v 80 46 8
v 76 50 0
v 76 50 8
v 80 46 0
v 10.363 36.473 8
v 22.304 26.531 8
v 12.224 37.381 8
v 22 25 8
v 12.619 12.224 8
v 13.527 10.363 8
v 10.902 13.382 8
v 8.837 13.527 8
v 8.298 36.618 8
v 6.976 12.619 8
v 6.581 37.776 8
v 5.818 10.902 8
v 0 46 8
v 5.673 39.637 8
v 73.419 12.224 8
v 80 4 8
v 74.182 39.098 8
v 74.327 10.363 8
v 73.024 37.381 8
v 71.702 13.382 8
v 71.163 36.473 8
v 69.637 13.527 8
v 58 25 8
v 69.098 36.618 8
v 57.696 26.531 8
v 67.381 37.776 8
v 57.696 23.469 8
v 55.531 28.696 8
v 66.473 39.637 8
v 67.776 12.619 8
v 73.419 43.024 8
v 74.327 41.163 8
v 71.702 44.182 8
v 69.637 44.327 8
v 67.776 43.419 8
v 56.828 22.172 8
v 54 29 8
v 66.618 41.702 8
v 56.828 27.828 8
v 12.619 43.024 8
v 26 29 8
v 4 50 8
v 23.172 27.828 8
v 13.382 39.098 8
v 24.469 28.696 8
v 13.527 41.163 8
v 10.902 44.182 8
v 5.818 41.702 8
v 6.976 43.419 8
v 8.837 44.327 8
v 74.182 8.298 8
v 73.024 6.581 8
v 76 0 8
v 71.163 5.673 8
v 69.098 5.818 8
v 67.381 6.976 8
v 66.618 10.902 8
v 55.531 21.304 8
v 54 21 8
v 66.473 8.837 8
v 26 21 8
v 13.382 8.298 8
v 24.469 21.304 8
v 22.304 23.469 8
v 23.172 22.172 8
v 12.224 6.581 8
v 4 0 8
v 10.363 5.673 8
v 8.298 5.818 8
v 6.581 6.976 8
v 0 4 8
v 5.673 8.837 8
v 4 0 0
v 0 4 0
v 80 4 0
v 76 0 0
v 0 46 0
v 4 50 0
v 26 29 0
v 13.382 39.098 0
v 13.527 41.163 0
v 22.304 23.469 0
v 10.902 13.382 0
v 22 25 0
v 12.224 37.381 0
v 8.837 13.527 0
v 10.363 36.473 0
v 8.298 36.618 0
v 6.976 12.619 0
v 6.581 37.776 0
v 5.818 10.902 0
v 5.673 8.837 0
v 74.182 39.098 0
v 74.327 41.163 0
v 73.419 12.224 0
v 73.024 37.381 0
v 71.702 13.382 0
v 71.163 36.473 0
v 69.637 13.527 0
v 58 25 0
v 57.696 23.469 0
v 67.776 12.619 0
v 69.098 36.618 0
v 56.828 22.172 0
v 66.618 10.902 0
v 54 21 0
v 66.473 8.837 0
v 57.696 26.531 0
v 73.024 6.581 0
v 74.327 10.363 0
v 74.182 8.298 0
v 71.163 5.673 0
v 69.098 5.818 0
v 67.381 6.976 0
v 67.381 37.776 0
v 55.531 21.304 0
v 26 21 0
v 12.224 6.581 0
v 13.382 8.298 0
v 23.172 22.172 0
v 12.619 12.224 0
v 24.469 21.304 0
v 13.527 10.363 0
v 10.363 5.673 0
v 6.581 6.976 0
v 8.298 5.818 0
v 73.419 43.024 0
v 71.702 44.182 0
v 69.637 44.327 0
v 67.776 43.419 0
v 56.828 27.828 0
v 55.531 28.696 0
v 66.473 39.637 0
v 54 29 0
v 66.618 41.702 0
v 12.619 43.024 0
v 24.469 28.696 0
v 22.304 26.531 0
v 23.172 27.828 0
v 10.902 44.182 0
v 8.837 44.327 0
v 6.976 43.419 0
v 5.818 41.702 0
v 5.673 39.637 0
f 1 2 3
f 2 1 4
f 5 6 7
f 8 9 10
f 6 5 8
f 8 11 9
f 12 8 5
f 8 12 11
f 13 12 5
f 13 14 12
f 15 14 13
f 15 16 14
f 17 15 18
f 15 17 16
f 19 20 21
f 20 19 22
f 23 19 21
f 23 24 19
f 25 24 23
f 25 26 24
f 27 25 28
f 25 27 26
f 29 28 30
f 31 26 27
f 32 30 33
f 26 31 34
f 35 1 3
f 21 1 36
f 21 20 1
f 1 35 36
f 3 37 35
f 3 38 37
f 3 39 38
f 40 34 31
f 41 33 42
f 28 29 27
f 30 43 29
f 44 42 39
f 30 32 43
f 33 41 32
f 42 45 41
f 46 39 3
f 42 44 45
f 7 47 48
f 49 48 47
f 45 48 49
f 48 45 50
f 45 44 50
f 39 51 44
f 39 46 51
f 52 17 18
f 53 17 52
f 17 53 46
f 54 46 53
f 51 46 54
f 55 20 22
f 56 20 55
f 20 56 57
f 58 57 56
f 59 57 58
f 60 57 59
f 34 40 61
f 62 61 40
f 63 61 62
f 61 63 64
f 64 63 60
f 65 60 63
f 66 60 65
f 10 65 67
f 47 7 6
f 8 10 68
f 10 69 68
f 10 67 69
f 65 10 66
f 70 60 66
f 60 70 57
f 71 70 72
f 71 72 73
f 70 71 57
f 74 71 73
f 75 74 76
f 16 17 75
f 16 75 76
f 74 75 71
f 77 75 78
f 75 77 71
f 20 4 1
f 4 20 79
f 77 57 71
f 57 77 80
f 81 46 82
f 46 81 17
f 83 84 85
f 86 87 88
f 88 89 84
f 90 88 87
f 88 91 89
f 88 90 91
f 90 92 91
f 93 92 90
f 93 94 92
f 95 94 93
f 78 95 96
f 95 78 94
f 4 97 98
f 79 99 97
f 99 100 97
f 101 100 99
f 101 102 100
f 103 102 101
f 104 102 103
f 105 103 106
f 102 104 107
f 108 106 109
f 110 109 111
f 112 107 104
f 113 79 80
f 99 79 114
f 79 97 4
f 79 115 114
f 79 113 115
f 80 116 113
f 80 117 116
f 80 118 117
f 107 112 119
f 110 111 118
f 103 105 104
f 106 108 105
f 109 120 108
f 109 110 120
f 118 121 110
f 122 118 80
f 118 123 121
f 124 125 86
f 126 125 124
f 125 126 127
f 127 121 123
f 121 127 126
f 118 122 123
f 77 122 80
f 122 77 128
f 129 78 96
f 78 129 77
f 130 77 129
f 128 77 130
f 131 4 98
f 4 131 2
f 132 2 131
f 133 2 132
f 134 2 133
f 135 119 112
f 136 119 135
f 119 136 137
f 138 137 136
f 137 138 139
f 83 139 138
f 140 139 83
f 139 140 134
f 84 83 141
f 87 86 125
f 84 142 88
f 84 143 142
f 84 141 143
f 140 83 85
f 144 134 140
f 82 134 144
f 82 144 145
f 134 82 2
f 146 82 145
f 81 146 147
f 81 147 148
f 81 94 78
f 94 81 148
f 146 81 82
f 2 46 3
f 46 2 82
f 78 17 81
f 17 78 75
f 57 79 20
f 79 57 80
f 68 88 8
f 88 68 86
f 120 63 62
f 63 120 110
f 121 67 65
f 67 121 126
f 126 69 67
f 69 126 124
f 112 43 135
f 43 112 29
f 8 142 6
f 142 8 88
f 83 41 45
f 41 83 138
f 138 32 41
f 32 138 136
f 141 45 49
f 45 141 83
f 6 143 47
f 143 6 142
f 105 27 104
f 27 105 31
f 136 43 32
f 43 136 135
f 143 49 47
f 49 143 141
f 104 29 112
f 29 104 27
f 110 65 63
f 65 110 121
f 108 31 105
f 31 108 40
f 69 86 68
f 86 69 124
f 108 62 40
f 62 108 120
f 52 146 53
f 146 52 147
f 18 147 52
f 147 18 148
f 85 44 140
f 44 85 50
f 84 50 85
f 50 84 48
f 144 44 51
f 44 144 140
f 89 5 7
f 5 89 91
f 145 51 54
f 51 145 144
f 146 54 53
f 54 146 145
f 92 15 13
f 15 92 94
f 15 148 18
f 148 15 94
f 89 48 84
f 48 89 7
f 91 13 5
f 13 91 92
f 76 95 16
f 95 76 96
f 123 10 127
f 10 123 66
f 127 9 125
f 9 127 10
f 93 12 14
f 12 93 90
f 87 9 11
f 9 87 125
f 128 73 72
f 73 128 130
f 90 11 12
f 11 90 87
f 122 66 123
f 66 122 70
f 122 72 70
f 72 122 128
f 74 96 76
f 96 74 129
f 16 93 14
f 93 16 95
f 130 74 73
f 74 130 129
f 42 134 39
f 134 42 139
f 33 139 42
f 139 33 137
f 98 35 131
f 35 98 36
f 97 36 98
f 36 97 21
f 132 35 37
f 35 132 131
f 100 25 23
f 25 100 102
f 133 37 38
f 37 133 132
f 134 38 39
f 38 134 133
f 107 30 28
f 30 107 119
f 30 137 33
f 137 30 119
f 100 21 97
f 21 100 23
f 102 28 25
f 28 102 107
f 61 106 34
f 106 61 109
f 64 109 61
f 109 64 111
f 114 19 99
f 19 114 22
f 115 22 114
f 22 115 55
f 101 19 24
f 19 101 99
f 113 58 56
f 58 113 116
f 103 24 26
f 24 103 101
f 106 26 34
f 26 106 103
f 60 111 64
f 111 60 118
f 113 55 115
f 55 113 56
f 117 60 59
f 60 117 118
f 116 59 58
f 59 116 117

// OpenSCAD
$fn = 32;

// ----------------------------------------------------------------------
// Bracket plate: slot plate 80 x 50
// ----------------------------------------------------------------------

// --- parameters (mm) ---
hole_r = 4;               // bolt hole radius
plate_t = 8;              // plate thickness, Z (extrusion height)
plate_l = 80;             // plate length
plate_w = 50;             // plate width
slot_l = 28;              // slot straight length
slot_r = 4;               // slot end radius

slot_len = slot_l + 2 * slot_r;
slot_w = 2 * slot_r;
hole_d2 = 2 * hole_r;

profile = [[4, 0], [76, 0], [80, 4], [80, 46], [76, 50], [4, 50], [0, 46], [0, 4]];  // primary outline, 8 points, counter clockwise
void_1 = [[54, 21], [55.531, 21.304], [56.828, 22.172], [57.696, 23.469], [58, 25], [57.696, 26.531], [56.828, 27.828], [55.531, 28.696], [54, 29], [26, 29], [24.469, 28.696], [23.172, 27.828], [22.304, 26.531], [22, 25], [22.304, 23.469], [23.172, 22.172], [24.469, 21.304], [26, 21]];  // grip slot, 18 points
void_2 = [[13.527, 41.163], [12.619, 43.024], [10.902, 44.182], [8.837, 44.327], [6.976, 43.419], [5.818, 41.702], [5.673, 39.637], [6.581, 37.776], [8.298, 36.618], [10.363, 36.473], [12.224, 37.381], [13.382, 39.098]];  // corner hole, 12 points
void_3 = [[13.527, 10.363], [12.619, 12.224], [10.902, 13.382], [8.837, 13.527], [6.976, 12.619], [5.818, 10.902], [5.673, 8.837], [6.581, 6.976], [8.298, 5.818], [10.363, 5.673], [12.224, 6.581], [13.382, 8.298]];  // corner hole, 12 points
void_4 = [[74.327, 41.163], [73.419, 43.024], [71.702, 44.182], [69.637, 44.327], [67.776, 43.419], [66.618, 41.702], [66.473, 39.637], [67.381, 37.776], [69.098, 36.618], [71.163, 36.473], [73.024, 37.381], [74.182, 39.098]];  // corner hole, 12 points
void_5 = [[74.327, 10.363], [73.419, 12.224], [71.702, 13.382], [69.637, 13.527], [67.776, 12.619], [66.618, 10.902], [66.473, 8.837], [67.381, 6.976], [69.098, 5.818], [71.163, 5.673], [73.024, 6.581], [74.182, 8.298]];  // corner hole, 12 points

// --- the one profile operation ---
difference() {
  linear_extrude(height = plate_t) polygon(points = profile);
  translate([0, 0, -1])
    linear_extrude(height = plate_t + 2) polygon(points = void_1);
  translate([0, 0, -1])
    linear_extrude(height = plate_t + 2) polygon(points = void_2);
  translate([0, 0, -1])
    linear_extrude(height = plate_t + 2) polygon(points = void_3);
  translate([0, 0, -1])
    linear_extrude(height = plate_t + 2) polygon(points = void_4);
  translate([0, 0, -1])
    linear_extrude(height = plate_t + 2) polygon(points = void_5);
}
